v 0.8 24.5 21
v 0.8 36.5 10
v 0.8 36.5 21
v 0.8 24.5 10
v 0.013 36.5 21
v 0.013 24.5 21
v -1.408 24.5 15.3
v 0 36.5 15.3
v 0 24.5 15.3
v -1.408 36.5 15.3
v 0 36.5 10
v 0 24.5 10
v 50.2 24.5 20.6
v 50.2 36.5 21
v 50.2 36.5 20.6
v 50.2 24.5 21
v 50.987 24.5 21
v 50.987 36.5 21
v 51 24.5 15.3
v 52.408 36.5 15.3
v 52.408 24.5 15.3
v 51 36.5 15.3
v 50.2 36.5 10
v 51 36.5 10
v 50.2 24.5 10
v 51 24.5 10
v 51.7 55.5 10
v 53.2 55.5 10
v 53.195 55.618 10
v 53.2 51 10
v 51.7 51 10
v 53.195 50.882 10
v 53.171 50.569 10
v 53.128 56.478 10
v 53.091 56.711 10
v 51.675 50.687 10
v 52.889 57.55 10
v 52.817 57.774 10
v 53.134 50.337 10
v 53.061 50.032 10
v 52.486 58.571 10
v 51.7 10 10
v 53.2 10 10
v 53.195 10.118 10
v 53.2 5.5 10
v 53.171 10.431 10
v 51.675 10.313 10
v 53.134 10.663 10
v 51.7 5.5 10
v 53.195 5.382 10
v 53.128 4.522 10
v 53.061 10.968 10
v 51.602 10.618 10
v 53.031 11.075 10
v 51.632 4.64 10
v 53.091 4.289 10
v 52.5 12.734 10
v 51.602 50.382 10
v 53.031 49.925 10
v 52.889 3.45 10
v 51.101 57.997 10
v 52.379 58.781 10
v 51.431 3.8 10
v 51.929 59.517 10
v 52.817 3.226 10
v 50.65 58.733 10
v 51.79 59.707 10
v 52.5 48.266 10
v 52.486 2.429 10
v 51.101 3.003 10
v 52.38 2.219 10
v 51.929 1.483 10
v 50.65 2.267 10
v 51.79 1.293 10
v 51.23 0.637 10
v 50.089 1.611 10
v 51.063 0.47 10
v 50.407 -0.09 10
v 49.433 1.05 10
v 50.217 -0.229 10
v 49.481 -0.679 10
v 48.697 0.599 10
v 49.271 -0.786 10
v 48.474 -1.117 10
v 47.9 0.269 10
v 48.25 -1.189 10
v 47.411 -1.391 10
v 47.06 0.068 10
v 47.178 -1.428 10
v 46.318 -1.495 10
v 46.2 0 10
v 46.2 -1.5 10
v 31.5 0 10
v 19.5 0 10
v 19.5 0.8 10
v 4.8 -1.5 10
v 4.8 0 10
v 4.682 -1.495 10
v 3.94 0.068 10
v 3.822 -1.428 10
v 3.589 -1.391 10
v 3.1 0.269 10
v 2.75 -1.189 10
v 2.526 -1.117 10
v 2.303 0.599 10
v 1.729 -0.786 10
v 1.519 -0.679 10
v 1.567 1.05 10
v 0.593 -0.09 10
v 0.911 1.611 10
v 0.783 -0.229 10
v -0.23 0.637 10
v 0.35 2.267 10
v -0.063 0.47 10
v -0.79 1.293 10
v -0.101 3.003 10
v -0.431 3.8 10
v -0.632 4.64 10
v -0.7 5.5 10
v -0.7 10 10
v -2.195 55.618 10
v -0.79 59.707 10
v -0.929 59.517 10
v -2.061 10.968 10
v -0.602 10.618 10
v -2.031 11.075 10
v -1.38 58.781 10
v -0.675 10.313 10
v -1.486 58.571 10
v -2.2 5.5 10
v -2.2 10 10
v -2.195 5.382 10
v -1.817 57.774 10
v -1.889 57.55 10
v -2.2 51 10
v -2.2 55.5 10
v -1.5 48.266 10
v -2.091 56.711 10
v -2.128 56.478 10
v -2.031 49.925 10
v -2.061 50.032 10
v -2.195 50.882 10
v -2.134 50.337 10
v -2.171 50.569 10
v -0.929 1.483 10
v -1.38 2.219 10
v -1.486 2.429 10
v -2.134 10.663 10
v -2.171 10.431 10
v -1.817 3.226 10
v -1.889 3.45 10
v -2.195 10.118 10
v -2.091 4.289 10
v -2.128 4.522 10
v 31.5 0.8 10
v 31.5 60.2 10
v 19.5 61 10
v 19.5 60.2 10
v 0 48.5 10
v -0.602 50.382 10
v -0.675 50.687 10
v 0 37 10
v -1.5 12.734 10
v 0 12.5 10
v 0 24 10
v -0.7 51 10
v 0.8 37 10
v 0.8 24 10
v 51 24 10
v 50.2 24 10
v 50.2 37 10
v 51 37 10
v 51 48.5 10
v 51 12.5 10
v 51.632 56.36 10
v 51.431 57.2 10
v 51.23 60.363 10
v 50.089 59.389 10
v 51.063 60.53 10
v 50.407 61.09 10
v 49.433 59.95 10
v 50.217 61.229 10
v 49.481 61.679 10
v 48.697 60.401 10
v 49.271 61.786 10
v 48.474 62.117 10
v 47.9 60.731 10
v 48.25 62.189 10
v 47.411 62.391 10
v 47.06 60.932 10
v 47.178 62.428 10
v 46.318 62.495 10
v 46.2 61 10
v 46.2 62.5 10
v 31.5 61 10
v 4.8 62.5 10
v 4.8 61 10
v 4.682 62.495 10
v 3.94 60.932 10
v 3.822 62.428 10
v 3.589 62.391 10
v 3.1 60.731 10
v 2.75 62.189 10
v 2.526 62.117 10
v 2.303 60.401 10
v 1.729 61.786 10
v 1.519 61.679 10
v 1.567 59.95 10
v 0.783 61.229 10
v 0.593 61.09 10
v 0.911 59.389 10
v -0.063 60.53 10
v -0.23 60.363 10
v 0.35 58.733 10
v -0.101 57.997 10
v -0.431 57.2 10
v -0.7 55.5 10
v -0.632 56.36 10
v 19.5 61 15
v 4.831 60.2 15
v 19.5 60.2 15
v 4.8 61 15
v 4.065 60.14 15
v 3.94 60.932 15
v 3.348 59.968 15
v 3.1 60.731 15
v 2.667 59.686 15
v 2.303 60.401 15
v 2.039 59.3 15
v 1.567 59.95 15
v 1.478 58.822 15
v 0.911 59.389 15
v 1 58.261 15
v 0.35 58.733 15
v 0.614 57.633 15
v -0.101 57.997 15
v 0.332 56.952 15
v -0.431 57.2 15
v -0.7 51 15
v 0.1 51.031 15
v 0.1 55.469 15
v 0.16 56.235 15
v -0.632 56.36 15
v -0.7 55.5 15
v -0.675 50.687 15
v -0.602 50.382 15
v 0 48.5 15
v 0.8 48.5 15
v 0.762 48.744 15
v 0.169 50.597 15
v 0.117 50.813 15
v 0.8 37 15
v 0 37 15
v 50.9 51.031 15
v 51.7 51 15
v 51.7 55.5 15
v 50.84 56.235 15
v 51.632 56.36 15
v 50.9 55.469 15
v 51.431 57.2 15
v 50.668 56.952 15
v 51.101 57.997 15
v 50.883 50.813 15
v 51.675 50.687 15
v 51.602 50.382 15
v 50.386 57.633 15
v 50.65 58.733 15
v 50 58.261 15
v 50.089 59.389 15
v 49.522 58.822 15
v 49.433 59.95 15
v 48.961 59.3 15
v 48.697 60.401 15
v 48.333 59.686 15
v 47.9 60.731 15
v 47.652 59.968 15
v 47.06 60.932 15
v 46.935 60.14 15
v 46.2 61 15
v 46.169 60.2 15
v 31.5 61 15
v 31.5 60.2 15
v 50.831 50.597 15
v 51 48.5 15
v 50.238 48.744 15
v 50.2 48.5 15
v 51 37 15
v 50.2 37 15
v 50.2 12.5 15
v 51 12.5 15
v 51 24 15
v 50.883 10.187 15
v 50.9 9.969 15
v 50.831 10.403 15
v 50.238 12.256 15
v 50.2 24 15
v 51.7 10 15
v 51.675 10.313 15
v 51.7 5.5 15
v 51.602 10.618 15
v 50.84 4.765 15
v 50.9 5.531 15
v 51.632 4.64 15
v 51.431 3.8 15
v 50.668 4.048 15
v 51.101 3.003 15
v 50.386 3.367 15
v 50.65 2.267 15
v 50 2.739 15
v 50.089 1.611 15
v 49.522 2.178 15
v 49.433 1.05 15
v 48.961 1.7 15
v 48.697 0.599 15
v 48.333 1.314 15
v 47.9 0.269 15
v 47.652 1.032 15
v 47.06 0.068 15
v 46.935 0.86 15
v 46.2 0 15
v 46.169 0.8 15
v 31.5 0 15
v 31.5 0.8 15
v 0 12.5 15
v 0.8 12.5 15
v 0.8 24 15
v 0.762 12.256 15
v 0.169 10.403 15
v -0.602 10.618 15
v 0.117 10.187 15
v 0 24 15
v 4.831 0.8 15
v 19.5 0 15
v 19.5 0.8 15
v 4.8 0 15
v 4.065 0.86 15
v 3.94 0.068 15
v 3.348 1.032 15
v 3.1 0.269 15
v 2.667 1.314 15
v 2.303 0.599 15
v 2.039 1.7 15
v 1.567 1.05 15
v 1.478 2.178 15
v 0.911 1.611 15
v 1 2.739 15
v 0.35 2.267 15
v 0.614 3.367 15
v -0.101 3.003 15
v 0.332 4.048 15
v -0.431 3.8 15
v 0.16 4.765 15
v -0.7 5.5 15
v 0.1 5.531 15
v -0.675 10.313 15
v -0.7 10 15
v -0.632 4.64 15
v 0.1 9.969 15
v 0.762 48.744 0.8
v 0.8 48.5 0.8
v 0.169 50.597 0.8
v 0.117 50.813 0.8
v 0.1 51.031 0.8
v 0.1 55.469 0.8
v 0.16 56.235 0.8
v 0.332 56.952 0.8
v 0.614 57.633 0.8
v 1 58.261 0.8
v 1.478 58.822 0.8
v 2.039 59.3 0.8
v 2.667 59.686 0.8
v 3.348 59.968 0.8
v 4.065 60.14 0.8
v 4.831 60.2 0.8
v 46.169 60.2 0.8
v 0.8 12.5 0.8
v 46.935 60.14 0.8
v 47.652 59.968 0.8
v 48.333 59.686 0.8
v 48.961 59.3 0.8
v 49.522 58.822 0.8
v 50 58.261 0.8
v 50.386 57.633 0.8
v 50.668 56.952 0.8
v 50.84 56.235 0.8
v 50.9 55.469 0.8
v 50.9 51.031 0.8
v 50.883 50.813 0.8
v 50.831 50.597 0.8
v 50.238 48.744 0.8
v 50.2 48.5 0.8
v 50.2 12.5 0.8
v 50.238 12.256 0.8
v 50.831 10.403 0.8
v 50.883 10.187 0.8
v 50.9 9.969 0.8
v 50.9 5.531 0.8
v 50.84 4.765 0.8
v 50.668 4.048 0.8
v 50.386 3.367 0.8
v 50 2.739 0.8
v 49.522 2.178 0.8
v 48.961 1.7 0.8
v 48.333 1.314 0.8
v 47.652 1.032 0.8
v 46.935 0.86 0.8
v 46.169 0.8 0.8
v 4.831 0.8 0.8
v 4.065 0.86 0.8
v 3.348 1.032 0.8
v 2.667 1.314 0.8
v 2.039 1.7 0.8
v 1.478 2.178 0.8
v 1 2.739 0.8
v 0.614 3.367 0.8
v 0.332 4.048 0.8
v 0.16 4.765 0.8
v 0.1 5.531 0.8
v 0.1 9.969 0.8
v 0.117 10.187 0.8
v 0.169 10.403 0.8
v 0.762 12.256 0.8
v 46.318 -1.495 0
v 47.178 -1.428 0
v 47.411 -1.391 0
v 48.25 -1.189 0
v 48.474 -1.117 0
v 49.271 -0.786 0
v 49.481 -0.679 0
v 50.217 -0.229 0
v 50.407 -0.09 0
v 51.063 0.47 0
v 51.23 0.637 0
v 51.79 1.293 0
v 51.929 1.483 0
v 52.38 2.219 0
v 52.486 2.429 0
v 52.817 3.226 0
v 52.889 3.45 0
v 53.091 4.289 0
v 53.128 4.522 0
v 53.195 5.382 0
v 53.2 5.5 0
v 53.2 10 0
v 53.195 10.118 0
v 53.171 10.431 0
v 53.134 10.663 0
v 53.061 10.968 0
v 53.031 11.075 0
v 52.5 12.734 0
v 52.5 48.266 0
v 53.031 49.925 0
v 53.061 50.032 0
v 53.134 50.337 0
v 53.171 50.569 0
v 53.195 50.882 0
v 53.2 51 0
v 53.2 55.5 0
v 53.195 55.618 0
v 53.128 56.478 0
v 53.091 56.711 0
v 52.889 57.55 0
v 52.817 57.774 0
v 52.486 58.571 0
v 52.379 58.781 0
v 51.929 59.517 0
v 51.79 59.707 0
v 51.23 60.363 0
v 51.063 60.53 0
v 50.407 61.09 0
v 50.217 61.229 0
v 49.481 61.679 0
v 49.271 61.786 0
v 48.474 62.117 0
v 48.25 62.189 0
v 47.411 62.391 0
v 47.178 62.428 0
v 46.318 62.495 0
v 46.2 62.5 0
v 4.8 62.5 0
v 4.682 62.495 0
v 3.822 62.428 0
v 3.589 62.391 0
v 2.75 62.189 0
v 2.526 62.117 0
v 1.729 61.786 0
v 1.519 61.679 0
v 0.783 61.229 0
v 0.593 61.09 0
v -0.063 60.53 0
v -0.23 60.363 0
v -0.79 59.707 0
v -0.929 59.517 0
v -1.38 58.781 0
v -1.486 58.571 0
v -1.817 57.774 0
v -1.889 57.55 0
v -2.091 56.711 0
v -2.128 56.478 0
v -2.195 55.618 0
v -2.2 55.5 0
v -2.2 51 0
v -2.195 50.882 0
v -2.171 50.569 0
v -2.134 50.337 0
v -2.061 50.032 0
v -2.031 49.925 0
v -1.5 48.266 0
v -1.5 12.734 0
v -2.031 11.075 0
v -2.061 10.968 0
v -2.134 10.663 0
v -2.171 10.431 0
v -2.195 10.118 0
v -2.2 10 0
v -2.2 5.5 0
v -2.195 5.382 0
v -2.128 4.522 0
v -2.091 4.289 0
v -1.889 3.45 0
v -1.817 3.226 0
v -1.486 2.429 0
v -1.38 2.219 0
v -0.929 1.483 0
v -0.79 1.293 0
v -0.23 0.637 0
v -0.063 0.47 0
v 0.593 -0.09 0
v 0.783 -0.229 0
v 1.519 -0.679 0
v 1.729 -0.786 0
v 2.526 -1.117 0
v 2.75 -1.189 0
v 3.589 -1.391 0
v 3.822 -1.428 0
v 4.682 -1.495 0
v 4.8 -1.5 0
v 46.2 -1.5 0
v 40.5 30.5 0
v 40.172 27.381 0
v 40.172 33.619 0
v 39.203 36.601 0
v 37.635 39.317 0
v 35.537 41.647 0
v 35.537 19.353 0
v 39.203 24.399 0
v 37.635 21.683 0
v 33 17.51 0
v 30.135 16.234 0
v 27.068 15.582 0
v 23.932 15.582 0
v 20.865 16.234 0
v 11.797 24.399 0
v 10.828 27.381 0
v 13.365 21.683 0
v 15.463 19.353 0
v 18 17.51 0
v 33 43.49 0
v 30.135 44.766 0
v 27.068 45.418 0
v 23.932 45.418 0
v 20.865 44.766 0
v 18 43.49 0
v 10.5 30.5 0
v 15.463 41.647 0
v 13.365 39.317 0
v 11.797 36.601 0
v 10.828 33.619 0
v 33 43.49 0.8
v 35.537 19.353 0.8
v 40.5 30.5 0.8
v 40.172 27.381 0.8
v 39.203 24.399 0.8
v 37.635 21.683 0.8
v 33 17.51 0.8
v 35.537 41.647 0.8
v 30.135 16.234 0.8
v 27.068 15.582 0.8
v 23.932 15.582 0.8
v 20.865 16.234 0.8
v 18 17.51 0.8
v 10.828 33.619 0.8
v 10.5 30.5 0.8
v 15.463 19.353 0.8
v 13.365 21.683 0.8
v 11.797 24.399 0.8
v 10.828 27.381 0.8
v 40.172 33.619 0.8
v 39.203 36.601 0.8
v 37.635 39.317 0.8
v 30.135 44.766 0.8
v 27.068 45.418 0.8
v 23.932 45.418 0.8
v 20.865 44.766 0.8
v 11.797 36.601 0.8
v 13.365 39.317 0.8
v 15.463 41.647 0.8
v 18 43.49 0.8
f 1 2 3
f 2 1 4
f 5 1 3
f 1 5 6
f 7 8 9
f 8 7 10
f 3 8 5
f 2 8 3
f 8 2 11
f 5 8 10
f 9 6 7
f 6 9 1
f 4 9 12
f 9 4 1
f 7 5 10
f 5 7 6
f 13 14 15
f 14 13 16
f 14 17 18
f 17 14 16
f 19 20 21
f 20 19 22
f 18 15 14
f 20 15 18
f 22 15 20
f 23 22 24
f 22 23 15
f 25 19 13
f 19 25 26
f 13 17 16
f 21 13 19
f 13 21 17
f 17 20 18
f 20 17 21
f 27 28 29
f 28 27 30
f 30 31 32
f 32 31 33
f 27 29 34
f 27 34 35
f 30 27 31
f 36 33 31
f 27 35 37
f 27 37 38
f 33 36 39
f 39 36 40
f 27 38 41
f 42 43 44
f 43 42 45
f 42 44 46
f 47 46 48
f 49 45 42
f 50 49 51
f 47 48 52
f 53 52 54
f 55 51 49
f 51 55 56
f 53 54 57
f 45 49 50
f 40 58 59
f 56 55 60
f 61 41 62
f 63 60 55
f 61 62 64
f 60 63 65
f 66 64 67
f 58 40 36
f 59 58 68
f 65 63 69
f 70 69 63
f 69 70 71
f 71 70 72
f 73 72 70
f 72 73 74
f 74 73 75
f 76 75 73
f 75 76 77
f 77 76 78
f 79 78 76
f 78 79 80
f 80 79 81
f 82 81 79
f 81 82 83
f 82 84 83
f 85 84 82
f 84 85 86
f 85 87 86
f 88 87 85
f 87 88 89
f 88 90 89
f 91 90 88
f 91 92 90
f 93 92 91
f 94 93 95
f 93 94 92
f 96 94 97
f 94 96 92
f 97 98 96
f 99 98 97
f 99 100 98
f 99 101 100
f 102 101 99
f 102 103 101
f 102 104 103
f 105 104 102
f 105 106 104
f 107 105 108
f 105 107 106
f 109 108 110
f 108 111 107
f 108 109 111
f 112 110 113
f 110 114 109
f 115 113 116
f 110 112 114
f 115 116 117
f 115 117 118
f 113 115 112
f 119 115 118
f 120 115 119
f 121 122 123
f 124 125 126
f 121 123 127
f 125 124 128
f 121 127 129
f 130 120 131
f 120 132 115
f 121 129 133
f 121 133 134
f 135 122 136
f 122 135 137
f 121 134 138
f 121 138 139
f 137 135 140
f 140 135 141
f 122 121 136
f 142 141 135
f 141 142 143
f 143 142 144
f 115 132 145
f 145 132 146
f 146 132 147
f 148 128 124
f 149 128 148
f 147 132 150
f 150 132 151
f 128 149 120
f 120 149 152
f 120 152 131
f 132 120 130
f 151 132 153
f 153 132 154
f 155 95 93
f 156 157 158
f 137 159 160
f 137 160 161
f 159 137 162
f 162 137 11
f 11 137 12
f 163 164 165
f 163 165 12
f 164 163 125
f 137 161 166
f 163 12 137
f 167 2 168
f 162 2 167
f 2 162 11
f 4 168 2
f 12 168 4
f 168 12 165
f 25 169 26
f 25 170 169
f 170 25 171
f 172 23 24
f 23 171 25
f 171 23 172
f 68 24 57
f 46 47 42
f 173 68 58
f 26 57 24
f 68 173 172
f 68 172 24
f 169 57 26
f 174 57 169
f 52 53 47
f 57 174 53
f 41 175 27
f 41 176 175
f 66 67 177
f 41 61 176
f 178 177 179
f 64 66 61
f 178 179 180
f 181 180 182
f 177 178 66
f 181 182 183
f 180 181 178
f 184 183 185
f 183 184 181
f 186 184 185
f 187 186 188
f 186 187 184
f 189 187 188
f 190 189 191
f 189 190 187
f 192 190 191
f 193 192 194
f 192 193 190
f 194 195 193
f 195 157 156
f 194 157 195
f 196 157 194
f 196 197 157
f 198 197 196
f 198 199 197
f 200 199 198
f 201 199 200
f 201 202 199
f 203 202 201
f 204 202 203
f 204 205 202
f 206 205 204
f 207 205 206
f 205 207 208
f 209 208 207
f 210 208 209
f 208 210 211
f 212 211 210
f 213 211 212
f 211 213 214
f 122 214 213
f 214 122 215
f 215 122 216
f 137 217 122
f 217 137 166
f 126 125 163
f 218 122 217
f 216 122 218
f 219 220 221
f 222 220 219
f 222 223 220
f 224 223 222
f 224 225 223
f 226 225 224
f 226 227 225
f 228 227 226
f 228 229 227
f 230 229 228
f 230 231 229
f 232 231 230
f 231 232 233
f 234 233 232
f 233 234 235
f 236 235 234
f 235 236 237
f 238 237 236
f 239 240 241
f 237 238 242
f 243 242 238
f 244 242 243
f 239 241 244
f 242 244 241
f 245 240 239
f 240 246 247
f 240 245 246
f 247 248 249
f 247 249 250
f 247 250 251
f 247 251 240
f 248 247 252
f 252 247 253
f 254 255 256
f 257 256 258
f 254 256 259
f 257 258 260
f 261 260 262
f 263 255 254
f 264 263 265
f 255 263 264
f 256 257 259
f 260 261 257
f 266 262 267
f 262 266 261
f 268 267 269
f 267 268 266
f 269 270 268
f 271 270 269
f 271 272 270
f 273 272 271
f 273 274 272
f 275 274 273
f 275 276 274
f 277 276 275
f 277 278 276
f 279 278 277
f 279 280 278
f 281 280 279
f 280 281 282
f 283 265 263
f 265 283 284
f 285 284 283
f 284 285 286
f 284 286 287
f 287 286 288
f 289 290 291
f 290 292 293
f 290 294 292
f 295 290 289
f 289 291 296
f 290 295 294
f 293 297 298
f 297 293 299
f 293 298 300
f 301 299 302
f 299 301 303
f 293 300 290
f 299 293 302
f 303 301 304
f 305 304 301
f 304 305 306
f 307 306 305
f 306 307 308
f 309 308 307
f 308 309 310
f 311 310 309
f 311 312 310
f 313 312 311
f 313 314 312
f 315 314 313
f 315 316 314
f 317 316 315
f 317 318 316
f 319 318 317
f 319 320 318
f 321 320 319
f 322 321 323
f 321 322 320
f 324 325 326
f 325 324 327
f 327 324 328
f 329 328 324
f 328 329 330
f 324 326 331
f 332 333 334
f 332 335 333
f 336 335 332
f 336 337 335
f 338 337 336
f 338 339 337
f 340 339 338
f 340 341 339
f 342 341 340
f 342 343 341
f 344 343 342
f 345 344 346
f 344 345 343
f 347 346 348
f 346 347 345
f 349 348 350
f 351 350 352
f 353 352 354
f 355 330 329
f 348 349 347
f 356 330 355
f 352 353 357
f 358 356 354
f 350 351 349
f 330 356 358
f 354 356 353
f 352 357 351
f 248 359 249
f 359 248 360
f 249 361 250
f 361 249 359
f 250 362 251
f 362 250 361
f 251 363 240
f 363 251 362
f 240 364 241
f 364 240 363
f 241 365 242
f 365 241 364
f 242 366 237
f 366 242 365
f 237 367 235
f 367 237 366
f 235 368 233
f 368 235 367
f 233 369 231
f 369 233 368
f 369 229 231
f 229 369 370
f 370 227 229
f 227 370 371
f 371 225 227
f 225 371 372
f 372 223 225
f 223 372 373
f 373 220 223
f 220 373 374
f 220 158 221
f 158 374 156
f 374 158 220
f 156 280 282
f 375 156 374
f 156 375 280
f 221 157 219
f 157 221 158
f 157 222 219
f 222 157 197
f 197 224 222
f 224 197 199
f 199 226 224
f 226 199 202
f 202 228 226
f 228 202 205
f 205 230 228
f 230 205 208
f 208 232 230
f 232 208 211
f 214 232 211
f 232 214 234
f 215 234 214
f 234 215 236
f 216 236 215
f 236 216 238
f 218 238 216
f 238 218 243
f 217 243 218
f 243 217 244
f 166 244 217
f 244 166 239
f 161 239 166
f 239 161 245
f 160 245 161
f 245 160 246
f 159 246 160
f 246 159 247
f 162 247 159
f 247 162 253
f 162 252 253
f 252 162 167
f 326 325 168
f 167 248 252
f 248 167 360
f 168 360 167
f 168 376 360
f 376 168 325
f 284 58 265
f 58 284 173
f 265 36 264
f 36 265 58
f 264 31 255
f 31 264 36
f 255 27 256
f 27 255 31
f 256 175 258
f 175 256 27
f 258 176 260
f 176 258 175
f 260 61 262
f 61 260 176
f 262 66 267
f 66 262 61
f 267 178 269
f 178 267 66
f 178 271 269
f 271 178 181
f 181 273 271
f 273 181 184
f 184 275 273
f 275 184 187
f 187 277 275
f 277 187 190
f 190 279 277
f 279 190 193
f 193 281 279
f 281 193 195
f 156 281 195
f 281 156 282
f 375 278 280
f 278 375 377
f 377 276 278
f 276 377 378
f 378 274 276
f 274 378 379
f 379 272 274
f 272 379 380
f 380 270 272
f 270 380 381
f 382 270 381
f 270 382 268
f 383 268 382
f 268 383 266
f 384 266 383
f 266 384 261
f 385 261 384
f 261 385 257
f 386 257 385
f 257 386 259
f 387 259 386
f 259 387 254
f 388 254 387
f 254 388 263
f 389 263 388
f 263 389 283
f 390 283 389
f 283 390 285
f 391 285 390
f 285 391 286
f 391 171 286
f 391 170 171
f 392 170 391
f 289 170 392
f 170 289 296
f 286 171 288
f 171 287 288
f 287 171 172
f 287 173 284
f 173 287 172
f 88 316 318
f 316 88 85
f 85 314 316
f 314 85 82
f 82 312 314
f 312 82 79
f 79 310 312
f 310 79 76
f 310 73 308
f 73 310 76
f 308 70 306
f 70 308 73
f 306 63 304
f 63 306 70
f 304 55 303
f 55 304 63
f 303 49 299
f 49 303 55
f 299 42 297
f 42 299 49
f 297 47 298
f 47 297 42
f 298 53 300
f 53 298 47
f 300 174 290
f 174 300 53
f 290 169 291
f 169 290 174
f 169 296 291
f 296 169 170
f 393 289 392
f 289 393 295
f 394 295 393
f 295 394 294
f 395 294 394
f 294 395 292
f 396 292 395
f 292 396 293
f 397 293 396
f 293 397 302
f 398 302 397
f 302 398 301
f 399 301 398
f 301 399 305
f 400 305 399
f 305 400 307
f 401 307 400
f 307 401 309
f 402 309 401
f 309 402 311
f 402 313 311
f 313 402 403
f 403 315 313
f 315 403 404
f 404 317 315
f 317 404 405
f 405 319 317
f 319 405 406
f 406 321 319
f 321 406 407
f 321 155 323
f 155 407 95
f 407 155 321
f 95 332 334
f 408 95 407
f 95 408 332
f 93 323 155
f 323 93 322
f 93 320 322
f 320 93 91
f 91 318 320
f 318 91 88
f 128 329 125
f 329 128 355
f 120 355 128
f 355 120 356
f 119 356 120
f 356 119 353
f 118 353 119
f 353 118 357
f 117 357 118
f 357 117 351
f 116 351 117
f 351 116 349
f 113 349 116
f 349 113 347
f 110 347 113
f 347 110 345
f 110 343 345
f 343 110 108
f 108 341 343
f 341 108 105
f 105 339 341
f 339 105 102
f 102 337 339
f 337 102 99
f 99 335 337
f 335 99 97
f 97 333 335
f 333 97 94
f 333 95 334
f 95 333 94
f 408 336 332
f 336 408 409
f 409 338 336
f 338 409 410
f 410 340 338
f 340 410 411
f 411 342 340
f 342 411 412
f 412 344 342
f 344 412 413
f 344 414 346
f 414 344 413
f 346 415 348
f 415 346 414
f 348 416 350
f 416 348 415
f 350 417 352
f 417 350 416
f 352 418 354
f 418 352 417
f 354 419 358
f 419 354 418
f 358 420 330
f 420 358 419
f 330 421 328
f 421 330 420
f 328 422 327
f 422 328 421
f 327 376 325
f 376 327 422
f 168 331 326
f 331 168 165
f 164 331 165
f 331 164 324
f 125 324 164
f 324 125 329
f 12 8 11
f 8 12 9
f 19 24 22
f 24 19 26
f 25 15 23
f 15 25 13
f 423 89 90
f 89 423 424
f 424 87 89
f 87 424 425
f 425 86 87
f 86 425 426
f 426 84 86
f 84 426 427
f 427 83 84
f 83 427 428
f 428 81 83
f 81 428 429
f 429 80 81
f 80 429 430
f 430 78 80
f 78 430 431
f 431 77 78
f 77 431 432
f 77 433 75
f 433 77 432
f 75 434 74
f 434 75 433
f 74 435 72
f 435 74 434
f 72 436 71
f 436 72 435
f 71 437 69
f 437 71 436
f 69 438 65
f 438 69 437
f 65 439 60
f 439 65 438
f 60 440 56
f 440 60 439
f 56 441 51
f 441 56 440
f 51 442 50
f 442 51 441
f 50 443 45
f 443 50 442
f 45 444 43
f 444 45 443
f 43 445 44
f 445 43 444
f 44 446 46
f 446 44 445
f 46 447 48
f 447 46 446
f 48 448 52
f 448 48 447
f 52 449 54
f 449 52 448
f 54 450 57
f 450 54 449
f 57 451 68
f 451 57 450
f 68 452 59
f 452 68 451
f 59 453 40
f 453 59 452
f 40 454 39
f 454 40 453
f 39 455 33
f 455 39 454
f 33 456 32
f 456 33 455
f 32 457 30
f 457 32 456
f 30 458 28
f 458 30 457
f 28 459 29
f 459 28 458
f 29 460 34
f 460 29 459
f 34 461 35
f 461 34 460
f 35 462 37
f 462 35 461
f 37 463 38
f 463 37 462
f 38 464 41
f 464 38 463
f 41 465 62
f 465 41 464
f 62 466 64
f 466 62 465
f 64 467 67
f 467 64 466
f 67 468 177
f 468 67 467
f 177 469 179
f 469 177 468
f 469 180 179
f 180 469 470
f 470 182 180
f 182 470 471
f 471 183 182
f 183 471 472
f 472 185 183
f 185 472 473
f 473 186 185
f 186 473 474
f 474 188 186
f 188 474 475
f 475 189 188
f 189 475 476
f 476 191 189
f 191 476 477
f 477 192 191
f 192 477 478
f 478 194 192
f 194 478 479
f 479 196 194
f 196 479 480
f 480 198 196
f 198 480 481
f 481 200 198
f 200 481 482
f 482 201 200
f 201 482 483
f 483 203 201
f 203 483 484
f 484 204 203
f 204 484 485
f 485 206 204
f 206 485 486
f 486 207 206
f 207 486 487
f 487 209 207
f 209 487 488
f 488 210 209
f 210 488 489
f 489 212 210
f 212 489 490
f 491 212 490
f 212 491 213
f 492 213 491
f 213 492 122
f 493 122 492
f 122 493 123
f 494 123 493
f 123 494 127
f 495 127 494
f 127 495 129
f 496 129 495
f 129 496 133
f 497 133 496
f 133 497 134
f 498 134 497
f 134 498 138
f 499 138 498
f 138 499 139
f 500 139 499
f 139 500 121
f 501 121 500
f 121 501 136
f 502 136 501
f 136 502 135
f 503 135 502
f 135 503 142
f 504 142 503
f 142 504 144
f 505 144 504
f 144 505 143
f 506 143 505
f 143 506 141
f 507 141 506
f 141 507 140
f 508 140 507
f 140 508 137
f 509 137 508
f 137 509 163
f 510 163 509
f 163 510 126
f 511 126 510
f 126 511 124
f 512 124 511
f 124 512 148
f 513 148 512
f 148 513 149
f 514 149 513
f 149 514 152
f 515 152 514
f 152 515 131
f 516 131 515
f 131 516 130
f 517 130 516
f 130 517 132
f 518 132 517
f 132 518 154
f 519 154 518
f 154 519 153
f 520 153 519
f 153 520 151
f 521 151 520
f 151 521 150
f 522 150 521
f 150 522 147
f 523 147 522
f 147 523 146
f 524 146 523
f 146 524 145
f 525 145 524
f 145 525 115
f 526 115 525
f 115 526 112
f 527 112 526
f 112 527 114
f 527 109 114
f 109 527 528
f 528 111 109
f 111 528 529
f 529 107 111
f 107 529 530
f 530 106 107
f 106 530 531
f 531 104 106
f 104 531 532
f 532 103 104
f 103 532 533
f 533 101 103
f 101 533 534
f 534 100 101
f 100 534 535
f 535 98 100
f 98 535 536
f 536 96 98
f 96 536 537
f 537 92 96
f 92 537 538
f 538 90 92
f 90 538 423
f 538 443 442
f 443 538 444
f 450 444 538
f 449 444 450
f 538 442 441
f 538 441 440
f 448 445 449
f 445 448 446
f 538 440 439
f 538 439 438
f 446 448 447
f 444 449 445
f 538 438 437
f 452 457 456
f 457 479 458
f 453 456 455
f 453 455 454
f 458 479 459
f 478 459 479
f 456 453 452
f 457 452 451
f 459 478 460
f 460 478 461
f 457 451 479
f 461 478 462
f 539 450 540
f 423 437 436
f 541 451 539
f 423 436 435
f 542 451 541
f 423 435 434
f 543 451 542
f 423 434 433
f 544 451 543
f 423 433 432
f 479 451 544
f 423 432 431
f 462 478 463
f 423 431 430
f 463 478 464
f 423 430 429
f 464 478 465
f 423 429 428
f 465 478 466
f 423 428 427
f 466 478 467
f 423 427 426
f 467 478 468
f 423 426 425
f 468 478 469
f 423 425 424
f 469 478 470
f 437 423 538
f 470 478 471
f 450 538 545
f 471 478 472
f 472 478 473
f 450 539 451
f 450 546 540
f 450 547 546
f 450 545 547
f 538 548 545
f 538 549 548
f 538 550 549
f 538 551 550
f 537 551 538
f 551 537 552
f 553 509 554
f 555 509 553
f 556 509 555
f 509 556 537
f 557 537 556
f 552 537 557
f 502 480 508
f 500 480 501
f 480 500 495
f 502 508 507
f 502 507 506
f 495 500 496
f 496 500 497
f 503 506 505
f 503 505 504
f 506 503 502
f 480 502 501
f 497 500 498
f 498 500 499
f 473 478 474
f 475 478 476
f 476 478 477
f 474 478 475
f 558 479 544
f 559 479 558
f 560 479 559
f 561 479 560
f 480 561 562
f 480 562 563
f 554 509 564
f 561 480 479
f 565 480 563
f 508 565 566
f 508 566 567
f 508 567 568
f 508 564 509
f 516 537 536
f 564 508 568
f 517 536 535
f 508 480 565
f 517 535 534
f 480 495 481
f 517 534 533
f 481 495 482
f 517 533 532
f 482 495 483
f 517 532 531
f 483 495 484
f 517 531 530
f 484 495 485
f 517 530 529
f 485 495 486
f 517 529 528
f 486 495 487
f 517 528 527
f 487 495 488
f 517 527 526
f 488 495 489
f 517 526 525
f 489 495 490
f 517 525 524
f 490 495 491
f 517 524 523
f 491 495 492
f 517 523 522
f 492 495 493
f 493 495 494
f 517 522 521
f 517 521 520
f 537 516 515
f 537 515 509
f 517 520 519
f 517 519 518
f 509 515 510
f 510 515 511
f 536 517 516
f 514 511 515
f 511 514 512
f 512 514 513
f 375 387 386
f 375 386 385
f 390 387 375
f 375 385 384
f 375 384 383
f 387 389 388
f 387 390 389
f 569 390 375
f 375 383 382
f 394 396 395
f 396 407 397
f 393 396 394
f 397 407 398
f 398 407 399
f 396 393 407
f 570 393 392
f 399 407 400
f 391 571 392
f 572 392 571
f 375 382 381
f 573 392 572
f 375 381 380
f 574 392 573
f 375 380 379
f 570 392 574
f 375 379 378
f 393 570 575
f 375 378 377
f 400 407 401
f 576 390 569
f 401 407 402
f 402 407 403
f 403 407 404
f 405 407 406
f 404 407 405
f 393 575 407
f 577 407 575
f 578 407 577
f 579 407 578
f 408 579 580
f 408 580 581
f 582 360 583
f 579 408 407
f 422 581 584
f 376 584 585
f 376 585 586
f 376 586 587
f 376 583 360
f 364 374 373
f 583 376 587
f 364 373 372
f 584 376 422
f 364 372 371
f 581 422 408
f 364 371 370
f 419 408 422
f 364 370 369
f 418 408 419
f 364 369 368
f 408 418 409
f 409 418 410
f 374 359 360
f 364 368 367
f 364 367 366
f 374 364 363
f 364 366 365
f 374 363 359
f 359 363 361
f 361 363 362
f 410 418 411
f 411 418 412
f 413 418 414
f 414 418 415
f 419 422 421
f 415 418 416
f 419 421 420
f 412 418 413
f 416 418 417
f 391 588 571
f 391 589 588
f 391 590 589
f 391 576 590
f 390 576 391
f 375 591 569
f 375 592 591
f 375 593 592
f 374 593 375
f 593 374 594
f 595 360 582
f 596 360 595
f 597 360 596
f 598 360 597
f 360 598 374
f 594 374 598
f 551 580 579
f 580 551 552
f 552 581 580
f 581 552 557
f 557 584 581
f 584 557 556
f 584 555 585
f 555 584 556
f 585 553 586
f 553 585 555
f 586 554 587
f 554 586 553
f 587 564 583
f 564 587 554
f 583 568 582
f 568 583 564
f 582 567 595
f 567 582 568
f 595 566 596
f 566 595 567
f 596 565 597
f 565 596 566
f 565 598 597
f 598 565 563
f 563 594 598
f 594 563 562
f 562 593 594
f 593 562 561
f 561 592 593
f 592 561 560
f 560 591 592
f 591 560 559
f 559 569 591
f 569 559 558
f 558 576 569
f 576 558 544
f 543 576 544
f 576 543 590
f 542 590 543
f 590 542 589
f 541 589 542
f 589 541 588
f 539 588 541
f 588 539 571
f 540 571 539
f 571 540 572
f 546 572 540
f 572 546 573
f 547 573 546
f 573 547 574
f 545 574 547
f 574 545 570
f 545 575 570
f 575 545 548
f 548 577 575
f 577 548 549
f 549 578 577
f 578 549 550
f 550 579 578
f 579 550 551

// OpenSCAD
thickness = 0.8;
w = 51;
h = 61;

a();
//b();
//b(true);

module a() {
    translate([0, 0, 10]) {
        linear_extrude(height=5) difference() {
            body(w, h);
            offset(r=-thickness) body(w, h);
            translate([0, (h-(12+1))/2]) square([thickness+w, 12+1]);
            translate([(w-(12))/2, 0]) square([12, thickness+h]);
        }
        translate([0, (h-12)/2]) cube([thickness, 12, 5+6-0.4]);
        translate([0-1.5, (h-12)/2, 5+0.3]) clip();
        translate([w-thickness, (h-12)/2]) cube([thickness, 12, 5+6-0.4]);
        translate([w+1.5, (h-12)/2, 5+0.3]) mirror([1, 0]) clip();
    }

    module clip()  difference() {
        cube([thickness+1.5, 12, 6-0.3]);
        translate([-3, 0]) rotate([0, 14]) cube([3, 12, 10]);
    }

    translate([0, 0, 10-3]) linear_extrude(height=3) difference() {
        offset(r=1.5) body(w, h);
        offset(r=-thickness) body(w, h);
    }

    linear_extrude(height=10) difference() {
        offset(r=1.5) body(w, h);
        offset(r=-thickness) body(w, h);
    }

    linear_extrude(height=thickness) difference() {
        offset(r=1.5) body(w, h);
        translate([w/2, h/2]) circle(d=30);
    }
}

module b(hole) difference() {
    $fn=100;
    union() {
        translate([0, 0, thickness+3]) cylinder(d1=30, d2=28, h=10);
        cylinder(d=30, h=thickness+3);
        cylinder(d=30+5, h=thickness);
    }
    if(hole) {
        cylinder(d1=30-thickness*2, d2=28-thickness*2, h=thickness+3+10);
    }
}

module body(w, h) {
    translate([w, h]) corner();
    translate([0, h]) mirror([1, 0]) corner();
    translate([w, 0]) mirror([0, 1]) corner();
    mirror([0, 1]) mirror([1, 0]) corner();
    translate([5, 0]) square([w-10, h]);
    translate([0, 5]) square([w, h-10]);
    //square([w, h]);
}

module corner() translate([-5-4.3, -5-7-11/2]) {
    translate([5, 5]) hull() {
        translate([-0.5, 7]) circle(d=11, $fn=40);
        translate([3, 2.5]) circle(d=4, $fn=40);
        square([4.3, 1]);
    }
    
    square([5+4.3, 10]);
    square([5-0.5, 5+7+11/2]);
}
